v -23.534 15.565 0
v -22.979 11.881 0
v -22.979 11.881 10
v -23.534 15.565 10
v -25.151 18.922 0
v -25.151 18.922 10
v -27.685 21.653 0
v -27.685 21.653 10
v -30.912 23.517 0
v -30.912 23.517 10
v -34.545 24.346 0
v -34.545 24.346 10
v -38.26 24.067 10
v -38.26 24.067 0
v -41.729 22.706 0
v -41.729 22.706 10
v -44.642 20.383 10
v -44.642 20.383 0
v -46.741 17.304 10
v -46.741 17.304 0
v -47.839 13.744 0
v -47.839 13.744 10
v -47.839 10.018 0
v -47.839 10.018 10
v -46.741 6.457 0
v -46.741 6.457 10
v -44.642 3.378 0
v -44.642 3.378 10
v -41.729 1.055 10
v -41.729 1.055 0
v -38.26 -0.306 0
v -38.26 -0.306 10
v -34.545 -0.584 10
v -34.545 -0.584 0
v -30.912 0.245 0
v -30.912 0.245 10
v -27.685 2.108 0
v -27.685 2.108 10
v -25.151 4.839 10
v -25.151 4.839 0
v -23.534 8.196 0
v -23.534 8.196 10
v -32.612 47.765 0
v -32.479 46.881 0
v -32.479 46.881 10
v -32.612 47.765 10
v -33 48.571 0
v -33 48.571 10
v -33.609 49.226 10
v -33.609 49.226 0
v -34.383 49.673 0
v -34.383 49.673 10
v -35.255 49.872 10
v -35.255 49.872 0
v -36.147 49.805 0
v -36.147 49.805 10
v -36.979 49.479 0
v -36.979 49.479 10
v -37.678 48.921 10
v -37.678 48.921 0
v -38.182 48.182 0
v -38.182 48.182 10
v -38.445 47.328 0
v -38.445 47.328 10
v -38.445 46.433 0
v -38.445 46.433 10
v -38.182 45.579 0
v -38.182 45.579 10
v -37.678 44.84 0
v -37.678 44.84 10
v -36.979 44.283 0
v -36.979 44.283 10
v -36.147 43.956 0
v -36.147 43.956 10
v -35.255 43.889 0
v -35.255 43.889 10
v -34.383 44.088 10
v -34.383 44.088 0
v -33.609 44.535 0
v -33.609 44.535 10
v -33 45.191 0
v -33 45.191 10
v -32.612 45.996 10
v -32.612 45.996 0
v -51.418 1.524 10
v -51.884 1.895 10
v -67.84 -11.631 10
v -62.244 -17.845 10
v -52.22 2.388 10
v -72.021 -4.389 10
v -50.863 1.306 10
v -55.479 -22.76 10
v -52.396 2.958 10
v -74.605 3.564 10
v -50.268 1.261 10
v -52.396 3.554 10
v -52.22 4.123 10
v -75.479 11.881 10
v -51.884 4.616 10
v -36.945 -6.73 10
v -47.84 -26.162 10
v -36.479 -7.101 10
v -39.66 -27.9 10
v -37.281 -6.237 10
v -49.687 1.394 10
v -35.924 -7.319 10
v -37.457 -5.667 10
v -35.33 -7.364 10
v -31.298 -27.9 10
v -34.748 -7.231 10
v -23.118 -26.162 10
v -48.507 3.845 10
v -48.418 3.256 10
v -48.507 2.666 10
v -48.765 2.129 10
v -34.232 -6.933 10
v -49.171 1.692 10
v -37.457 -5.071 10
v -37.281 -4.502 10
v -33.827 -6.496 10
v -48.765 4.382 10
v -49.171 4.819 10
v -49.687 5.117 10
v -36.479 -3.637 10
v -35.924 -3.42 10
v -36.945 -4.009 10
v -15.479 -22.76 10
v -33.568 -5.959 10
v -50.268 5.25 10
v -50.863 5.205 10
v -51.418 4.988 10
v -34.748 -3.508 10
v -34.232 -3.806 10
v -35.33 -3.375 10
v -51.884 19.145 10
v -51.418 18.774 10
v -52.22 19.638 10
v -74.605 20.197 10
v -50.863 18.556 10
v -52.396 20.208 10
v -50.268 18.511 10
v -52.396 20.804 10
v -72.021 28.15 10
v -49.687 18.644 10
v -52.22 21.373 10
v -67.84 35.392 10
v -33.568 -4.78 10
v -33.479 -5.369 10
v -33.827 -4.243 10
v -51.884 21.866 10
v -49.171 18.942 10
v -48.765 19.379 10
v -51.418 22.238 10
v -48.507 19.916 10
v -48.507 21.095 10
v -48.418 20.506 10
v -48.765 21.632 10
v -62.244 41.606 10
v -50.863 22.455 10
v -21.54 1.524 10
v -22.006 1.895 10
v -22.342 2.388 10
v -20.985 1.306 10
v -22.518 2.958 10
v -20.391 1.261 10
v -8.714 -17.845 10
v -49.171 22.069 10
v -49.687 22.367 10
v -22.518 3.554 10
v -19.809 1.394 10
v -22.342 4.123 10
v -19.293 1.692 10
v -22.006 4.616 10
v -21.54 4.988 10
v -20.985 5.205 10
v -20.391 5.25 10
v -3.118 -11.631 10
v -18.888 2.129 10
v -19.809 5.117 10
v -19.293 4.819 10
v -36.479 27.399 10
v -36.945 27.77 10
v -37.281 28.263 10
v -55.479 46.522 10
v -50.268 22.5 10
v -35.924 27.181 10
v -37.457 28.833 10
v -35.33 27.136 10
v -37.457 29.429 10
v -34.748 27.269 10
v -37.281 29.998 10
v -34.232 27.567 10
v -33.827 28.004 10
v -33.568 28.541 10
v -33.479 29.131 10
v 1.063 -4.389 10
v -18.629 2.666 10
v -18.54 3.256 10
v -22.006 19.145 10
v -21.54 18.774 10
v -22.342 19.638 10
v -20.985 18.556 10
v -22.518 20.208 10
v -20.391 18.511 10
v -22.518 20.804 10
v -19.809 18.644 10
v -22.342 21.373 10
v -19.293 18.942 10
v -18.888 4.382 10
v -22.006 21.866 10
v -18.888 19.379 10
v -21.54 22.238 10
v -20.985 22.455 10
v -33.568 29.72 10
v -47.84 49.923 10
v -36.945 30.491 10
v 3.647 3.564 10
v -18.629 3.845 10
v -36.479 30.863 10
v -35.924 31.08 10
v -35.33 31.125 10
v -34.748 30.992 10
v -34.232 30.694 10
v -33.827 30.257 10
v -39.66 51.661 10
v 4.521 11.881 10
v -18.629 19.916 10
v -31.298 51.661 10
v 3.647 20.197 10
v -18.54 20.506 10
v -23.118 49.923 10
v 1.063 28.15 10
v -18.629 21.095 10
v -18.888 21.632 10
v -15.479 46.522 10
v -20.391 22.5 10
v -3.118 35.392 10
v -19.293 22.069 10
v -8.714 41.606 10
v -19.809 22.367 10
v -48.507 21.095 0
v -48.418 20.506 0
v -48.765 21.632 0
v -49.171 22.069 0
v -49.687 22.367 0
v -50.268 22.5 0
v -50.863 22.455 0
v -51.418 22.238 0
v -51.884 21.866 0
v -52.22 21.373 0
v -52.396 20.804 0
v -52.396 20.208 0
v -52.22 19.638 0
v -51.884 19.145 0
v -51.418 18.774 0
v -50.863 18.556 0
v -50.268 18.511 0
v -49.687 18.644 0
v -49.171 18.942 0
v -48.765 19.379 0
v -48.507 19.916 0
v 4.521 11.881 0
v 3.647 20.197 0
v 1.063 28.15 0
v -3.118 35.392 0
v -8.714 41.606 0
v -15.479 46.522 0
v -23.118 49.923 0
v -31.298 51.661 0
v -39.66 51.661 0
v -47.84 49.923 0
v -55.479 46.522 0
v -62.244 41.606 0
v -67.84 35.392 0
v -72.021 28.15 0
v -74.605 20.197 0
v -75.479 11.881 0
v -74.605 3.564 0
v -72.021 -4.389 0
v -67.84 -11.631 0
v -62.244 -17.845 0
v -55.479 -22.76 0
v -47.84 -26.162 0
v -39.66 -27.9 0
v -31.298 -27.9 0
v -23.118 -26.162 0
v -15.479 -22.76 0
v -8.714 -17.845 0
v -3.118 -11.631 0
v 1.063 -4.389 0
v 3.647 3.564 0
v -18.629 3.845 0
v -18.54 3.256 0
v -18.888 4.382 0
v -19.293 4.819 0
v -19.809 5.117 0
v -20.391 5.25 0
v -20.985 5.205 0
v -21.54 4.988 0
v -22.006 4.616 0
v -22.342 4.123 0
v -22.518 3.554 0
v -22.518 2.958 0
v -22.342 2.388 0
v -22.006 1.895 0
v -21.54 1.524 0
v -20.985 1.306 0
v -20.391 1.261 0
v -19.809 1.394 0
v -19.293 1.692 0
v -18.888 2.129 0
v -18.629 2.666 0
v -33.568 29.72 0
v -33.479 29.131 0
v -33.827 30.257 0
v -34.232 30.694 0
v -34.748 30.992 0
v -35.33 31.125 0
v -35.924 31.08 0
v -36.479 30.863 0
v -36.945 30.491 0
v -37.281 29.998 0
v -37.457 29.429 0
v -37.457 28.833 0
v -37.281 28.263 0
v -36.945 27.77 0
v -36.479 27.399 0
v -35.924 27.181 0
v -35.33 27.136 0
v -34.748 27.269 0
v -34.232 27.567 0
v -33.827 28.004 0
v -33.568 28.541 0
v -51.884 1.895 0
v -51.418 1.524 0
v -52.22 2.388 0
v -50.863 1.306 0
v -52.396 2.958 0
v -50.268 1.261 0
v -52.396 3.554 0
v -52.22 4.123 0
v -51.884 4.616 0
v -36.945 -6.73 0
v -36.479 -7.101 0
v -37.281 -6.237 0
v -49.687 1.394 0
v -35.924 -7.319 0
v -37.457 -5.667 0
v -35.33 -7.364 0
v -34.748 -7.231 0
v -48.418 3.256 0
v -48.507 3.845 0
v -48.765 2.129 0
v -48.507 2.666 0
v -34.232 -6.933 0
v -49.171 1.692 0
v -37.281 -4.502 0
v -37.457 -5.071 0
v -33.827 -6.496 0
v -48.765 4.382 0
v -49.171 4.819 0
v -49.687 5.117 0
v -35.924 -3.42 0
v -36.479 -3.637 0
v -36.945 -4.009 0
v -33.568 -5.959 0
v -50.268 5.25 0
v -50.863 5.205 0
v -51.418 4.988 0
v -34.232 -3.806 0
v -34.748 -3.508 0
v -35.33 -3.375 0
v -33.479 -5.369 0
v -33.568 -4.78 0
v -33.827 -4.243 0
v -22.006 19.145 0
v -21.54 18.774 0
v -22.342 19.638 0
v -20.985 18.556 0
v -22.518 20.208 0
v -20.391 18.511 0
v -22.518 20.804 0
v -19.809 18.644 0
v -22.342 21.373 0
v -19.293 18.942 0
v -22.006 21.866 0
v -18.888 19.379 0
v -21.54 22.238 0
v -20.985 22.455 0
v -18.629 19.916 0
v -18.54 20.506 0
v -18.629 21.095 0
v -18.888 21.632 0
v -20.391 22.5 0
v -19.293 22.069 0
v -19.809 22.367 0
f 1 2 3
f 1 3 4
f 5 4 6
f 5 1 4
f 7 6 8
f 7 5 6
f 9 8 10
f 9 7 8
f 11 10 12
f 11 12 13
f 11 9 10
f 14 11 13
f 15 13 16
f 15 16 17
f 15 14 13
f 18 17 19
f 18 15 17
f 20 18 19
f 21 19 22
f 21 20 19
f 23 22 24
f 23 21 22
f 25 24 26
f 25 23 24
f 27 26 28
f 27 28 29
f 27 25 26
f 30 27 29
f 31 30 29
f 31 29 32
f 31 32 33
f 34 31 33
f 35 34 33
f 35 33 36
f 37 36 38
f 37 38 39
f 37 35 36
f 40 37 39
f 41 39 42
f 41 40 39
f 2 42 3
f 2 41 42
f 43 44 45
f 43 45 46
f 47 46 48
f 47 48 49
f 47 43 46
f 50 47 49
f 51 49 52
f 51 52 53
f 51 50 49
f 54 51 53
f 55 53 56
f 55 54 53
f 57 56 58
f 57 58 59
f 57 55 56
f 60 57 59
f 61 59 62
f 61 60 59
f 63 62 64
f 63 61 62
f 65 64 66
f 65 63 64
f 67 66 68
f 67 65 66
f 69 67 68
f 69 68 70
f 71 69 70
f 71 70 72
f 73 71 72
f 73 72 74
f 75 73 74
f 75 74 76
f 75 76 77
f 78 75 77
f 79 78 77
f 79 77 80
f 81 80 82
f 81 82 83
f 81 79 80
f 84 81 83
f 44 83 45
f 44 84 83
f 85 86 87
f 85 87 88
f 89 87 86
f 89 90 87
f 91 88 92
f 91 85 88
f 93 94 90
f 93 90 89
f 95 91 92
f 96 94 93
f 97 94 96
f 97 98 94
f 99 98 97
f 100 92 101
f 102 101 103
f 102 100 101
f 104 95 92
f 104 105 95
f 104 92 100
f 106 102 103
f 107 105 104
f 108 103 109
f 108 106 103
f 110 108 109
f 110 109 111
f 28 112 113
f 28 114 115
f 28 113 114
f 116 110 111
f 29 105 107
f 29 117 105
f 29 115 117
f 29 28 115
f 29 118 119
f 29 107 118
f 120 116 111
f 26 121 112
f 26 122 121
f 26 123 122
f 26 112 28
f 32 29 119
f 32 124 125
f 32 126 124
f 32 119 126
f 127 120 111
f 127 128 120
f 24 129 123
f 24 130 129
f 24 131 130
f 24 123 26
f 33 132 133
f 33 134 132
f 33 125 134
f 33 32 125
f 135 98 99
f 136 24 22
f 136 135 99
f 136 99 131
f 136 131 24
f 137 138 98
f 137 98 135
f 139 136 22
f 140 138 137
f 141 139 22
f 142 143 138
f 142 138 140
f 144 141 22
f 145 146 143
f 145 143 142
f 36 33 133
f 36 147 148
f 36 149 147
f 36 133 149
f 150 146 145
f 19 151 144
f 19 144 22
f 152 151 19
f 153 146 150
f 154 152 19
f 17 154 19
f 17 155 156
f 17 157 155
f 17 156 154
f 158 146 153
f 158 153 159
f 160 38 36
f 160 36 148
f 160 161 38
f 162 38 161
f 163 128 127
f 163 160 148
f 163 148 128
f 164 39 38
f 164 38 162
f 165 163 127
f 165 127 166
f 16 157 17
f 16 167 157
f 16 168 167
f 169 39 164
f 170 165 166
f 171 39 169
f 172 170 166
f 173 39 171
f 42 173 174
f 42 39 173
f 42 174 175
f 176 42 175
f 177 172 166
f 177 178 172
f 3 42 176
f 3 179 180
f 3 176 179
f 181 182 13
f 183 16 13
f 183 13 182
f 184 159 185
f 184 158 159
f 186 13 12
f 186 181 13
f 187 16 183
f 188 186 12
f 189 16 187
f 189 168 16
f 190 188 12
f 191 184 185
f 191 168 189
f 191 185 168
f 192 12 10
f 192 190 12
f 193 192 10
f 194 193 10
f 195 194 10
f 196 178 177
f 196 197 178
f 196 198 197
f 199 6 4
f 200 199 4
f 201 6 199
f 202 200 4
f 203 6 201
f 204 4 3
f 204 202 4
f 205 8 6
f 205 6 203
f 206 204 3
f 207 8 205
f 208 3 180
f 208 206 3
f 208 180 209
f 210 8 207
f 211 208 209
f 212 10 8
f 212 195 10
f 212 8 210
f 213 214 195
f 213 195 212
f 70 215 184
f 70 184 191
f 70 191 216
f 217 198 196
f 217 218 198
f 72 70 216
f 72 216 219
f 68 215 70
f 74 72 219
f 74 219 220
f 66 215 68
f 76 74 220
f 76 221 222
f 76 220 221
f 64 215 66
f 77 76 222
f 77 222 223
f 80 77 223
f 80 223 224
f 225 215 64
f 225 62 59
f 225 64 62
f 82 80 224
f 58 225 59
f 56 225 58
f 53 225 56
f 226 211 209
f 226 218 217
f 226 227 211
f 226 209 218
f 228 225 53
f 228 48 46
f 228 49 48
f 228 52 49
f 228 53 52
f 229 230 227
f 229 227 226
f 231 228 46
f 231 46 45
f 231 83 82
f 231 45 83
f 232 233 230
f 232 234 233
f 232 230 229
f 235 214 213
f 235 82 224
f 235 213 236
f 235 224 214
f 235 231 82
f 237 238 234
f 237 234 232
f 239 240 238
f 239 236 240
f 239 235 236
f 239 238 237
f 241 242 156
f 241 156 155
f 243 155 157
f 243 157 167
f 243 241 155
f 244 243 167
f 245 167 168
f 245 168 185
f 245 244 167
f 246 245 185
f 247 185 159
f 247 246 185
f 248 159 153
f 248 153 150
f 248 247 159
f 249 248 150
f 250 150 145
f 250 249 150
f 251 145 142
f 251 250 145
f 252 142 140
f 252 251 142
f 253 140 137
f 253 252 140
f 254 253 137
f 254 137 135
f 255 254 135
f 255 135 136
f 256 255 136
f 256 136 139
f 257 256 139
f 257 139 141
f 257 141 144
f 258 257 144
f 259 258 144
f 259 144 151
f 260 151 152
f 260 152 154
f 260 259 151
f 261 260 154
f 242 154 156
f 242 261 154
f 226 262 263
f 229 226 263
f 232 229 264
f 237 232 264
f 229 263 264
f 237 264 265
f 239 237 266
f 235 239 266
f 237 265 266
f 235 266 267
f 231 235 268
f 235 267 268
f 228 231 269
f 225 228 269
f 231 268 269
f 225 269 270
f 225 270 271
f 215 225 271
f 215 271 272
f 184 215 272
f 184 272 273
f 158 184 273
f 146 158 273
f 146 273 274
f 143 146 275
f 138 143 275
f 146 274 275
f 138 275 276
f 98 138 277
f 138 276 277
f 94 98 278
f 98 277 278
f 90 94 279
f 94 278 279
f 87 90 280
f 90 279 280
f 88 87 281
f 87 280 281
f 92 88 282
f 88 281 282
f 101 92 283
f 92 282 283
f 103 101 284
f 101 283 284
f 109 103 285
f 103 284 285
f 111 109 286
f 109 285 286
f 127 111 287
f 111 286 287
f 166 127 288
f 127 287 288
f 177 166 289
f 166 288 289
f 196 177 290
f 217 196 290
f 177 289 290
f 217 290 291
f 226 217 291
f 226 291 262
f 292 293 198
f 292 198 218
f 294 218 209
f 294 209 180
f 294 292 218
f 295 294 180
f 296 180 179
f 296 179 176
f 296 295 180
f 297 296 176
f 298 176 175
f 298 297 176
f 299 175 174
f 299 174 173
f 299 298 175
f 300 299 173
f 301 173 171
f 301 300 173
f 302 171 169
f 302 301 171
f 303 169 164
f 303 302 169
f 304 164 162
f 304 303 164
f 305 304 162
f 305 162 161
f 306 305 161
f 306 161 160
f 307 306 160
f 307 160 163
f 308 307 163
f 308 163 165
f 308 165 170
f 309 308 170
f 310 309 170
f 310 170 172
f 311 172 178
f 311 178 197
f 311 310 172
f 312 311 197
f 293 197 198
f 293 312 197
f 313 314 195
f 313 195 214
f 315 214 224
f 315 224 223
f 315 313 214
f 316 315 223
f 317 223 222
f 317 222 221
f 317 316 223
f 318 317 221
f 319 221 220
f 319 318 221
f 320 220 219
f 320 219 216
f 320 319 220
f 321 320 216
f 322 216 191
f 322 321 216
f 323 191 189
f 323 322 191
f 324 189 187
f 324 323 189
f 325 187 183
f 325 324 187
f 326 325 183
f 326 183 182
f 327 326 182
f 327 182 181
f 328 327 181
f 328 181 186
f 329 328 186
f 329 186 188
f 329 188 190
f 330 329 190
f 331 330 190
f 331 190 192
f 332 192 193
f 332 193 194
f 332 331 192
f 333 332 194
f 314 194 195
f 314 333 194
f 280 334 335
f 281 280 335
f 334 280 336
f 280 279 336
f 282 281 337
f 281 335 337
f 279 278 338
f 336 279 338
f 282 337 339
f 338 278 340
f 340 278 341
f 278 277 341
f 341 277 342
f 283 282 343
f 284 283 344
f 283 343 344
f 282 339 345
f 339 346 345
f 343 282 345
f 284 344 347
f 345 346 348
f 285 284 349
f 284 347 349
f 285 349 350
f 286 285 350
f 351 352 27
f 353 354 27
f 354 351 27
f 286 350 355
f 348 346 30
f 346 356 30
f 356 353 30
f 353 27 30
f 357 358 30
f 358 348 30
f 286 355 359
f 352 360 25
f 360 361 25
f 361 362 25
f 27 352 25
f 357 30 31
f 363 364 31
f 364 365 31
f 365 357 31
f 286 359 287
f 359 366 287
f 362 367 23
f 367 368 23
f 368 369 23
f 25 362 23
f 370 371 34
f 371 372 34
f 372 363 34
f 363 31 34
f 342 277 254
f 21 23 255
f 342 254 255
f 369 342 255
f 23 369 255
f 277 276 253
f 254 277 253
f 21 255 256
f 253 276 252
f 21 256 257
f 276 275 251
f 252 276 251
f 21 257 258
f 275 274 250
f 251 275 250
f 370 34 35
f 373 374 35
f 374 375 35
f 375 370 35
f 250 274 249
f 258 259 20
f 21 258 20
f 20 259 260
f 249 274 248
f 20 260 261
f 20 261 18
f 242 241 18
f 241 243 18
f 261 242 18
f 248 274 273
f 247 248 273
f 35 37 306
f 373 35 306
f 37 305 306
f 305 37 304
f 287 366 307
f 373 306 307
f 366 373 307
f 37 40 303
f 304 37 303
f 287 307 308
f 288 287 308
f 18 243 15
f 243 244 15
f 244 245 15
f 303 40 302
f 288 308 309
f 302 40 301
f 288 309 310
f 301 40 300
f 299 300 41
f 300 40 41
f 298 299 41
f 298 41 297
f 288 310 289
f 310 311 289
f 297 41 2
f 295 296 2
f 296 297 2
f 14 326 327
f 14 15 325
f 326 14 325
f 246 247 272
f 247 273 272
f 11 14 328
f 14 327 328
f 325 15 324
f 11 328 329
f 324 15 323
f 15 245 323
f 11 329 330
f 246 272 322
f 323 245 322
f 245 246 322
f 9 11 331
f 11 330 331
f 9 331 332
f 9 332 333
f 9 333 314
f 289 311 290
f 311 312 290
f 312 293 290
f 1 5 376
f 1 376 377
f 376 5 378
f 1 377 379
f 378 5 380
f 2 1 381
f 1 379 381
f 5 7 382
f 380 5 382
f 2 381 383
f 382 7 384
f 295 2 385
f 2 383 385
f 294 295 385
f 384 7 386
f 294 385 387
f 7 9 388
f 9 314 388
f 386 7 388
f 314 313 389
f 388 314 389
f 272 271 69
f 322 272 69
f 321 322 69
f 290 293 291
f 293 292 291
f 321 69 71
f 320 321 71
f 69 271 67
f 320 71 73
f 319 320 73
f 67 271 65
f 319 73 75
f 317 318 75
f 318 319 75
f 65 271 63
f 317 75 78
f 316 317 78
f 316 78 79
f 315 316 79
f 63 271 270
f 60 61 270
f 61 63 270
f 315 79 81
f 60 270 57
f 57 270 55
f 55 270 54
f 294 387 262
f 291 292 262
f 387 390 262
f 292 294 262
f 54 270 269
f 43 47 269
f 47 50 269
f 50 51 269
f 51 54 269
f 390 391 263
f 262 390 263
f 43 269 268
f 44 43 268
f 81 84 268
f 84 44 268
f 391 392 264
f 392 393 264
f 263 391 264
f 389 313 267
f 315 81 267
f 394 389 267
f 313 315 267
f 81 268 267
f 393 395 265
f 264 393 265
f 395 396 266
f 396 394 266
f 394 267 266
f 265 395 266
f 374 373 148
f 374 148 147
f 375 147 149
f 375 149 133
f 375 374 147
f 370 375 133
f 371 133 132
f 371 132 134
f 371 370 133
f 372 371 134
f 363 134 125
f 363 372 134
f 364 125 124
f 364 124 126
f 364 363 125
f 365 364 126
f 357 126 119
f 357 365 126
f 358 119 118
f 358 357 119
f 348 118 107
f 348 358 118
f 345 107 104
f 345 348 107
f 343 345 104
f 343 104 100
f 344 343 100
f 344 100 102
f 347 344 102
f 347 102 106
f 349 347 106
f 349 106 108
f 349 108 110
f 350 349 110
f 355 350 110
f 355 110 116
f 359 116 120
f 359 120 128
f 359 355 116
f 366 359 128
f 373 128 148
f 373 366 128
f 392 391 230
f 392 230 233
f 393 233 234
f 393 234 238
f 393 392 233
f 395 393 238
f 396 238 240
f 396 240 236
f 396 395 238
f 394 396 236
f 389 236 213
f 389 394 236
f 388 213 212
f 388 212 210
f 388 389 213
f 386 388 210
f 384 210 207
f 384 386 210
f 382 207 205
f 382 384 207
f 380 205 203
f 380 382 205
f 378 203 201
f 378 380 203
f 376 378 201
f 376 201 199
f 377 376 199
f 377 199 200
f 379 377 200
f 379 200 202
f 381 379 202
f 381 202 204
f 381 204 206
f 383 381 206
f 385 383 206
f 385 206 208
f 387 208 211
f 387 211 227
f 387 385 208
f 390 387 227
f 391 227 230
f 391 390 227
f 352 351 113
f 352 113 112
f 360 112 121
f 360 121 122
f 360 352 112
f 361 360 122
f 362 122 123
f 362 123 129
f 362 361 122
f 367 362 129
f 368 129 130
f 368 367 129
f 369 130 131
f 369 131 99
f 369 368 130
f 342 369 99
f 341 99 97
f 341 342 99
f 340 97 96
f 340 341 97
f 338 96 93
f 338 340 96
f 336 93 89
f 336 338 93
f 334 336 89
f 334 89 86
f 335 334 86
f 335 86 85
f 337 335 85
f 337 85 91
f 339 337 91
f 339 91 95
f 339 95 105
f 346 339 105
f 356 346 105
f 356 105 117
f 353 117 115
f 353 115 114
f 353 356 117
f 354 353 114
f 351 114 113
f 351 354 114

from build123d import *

# Parameters (mm, degrees)
SKETCH_1_R      = 40
SKETCH_1_R_2    = 12.5
SKETCH_1_R_3    = 2
SKETCH_1_R_4    = 3
EXTRUDE_1_DEPTH = 10


with BuildPart() as part:
    # 草图1 → 凸台-拉伸1 (new body)
    with BuildSketch(Plane.XY):
        with Locations((-35.478977731, 11.880589307)):
            Circle(SKETCH_1_R)
        with Locations((-35.478977731, 11.880589307)):
            Circle(SKETCH_1_R_2, mode=Mode.SUBTRACT)
        with Locations((-35.478977731, 29.130589307)):
            Circle(SKETCH_1_R_3, mode=Mode.SUBTRACT)
        with Locations((-20.540039516, 20.505589307)):
            Circle(SKETCH_1_R_3, mode=Mode.SUBTRACT)
        with Locations((-20.540039516, 3.255589307)):
            Circle(SKETCH_1_R_3, mode=Mode.SUBTRACT)
        with Locations((-35.478977731, -5.369410693)):
            Circle(SKETCH_1_R_3, mode=Mode.SUBTRACT)
        with Locations((-50.417915947, 3.255589307)):
            Circle(SKETCH_1_R_3, mode=Mode.SUBTRACT)
        with Locations((-50.417915947, 20.505589307)):
            Circle(SKETCH_1_R_3, mode=Mode.SUBTRACT)
        with Locations((-35.478977731, 46.880589307)):
            Circle(SKETCH_1_R_4, mode=Mode.SUBTRACT)
    extrude(amount=EXTRUDE_1_DEPTH)


solid = part.part
